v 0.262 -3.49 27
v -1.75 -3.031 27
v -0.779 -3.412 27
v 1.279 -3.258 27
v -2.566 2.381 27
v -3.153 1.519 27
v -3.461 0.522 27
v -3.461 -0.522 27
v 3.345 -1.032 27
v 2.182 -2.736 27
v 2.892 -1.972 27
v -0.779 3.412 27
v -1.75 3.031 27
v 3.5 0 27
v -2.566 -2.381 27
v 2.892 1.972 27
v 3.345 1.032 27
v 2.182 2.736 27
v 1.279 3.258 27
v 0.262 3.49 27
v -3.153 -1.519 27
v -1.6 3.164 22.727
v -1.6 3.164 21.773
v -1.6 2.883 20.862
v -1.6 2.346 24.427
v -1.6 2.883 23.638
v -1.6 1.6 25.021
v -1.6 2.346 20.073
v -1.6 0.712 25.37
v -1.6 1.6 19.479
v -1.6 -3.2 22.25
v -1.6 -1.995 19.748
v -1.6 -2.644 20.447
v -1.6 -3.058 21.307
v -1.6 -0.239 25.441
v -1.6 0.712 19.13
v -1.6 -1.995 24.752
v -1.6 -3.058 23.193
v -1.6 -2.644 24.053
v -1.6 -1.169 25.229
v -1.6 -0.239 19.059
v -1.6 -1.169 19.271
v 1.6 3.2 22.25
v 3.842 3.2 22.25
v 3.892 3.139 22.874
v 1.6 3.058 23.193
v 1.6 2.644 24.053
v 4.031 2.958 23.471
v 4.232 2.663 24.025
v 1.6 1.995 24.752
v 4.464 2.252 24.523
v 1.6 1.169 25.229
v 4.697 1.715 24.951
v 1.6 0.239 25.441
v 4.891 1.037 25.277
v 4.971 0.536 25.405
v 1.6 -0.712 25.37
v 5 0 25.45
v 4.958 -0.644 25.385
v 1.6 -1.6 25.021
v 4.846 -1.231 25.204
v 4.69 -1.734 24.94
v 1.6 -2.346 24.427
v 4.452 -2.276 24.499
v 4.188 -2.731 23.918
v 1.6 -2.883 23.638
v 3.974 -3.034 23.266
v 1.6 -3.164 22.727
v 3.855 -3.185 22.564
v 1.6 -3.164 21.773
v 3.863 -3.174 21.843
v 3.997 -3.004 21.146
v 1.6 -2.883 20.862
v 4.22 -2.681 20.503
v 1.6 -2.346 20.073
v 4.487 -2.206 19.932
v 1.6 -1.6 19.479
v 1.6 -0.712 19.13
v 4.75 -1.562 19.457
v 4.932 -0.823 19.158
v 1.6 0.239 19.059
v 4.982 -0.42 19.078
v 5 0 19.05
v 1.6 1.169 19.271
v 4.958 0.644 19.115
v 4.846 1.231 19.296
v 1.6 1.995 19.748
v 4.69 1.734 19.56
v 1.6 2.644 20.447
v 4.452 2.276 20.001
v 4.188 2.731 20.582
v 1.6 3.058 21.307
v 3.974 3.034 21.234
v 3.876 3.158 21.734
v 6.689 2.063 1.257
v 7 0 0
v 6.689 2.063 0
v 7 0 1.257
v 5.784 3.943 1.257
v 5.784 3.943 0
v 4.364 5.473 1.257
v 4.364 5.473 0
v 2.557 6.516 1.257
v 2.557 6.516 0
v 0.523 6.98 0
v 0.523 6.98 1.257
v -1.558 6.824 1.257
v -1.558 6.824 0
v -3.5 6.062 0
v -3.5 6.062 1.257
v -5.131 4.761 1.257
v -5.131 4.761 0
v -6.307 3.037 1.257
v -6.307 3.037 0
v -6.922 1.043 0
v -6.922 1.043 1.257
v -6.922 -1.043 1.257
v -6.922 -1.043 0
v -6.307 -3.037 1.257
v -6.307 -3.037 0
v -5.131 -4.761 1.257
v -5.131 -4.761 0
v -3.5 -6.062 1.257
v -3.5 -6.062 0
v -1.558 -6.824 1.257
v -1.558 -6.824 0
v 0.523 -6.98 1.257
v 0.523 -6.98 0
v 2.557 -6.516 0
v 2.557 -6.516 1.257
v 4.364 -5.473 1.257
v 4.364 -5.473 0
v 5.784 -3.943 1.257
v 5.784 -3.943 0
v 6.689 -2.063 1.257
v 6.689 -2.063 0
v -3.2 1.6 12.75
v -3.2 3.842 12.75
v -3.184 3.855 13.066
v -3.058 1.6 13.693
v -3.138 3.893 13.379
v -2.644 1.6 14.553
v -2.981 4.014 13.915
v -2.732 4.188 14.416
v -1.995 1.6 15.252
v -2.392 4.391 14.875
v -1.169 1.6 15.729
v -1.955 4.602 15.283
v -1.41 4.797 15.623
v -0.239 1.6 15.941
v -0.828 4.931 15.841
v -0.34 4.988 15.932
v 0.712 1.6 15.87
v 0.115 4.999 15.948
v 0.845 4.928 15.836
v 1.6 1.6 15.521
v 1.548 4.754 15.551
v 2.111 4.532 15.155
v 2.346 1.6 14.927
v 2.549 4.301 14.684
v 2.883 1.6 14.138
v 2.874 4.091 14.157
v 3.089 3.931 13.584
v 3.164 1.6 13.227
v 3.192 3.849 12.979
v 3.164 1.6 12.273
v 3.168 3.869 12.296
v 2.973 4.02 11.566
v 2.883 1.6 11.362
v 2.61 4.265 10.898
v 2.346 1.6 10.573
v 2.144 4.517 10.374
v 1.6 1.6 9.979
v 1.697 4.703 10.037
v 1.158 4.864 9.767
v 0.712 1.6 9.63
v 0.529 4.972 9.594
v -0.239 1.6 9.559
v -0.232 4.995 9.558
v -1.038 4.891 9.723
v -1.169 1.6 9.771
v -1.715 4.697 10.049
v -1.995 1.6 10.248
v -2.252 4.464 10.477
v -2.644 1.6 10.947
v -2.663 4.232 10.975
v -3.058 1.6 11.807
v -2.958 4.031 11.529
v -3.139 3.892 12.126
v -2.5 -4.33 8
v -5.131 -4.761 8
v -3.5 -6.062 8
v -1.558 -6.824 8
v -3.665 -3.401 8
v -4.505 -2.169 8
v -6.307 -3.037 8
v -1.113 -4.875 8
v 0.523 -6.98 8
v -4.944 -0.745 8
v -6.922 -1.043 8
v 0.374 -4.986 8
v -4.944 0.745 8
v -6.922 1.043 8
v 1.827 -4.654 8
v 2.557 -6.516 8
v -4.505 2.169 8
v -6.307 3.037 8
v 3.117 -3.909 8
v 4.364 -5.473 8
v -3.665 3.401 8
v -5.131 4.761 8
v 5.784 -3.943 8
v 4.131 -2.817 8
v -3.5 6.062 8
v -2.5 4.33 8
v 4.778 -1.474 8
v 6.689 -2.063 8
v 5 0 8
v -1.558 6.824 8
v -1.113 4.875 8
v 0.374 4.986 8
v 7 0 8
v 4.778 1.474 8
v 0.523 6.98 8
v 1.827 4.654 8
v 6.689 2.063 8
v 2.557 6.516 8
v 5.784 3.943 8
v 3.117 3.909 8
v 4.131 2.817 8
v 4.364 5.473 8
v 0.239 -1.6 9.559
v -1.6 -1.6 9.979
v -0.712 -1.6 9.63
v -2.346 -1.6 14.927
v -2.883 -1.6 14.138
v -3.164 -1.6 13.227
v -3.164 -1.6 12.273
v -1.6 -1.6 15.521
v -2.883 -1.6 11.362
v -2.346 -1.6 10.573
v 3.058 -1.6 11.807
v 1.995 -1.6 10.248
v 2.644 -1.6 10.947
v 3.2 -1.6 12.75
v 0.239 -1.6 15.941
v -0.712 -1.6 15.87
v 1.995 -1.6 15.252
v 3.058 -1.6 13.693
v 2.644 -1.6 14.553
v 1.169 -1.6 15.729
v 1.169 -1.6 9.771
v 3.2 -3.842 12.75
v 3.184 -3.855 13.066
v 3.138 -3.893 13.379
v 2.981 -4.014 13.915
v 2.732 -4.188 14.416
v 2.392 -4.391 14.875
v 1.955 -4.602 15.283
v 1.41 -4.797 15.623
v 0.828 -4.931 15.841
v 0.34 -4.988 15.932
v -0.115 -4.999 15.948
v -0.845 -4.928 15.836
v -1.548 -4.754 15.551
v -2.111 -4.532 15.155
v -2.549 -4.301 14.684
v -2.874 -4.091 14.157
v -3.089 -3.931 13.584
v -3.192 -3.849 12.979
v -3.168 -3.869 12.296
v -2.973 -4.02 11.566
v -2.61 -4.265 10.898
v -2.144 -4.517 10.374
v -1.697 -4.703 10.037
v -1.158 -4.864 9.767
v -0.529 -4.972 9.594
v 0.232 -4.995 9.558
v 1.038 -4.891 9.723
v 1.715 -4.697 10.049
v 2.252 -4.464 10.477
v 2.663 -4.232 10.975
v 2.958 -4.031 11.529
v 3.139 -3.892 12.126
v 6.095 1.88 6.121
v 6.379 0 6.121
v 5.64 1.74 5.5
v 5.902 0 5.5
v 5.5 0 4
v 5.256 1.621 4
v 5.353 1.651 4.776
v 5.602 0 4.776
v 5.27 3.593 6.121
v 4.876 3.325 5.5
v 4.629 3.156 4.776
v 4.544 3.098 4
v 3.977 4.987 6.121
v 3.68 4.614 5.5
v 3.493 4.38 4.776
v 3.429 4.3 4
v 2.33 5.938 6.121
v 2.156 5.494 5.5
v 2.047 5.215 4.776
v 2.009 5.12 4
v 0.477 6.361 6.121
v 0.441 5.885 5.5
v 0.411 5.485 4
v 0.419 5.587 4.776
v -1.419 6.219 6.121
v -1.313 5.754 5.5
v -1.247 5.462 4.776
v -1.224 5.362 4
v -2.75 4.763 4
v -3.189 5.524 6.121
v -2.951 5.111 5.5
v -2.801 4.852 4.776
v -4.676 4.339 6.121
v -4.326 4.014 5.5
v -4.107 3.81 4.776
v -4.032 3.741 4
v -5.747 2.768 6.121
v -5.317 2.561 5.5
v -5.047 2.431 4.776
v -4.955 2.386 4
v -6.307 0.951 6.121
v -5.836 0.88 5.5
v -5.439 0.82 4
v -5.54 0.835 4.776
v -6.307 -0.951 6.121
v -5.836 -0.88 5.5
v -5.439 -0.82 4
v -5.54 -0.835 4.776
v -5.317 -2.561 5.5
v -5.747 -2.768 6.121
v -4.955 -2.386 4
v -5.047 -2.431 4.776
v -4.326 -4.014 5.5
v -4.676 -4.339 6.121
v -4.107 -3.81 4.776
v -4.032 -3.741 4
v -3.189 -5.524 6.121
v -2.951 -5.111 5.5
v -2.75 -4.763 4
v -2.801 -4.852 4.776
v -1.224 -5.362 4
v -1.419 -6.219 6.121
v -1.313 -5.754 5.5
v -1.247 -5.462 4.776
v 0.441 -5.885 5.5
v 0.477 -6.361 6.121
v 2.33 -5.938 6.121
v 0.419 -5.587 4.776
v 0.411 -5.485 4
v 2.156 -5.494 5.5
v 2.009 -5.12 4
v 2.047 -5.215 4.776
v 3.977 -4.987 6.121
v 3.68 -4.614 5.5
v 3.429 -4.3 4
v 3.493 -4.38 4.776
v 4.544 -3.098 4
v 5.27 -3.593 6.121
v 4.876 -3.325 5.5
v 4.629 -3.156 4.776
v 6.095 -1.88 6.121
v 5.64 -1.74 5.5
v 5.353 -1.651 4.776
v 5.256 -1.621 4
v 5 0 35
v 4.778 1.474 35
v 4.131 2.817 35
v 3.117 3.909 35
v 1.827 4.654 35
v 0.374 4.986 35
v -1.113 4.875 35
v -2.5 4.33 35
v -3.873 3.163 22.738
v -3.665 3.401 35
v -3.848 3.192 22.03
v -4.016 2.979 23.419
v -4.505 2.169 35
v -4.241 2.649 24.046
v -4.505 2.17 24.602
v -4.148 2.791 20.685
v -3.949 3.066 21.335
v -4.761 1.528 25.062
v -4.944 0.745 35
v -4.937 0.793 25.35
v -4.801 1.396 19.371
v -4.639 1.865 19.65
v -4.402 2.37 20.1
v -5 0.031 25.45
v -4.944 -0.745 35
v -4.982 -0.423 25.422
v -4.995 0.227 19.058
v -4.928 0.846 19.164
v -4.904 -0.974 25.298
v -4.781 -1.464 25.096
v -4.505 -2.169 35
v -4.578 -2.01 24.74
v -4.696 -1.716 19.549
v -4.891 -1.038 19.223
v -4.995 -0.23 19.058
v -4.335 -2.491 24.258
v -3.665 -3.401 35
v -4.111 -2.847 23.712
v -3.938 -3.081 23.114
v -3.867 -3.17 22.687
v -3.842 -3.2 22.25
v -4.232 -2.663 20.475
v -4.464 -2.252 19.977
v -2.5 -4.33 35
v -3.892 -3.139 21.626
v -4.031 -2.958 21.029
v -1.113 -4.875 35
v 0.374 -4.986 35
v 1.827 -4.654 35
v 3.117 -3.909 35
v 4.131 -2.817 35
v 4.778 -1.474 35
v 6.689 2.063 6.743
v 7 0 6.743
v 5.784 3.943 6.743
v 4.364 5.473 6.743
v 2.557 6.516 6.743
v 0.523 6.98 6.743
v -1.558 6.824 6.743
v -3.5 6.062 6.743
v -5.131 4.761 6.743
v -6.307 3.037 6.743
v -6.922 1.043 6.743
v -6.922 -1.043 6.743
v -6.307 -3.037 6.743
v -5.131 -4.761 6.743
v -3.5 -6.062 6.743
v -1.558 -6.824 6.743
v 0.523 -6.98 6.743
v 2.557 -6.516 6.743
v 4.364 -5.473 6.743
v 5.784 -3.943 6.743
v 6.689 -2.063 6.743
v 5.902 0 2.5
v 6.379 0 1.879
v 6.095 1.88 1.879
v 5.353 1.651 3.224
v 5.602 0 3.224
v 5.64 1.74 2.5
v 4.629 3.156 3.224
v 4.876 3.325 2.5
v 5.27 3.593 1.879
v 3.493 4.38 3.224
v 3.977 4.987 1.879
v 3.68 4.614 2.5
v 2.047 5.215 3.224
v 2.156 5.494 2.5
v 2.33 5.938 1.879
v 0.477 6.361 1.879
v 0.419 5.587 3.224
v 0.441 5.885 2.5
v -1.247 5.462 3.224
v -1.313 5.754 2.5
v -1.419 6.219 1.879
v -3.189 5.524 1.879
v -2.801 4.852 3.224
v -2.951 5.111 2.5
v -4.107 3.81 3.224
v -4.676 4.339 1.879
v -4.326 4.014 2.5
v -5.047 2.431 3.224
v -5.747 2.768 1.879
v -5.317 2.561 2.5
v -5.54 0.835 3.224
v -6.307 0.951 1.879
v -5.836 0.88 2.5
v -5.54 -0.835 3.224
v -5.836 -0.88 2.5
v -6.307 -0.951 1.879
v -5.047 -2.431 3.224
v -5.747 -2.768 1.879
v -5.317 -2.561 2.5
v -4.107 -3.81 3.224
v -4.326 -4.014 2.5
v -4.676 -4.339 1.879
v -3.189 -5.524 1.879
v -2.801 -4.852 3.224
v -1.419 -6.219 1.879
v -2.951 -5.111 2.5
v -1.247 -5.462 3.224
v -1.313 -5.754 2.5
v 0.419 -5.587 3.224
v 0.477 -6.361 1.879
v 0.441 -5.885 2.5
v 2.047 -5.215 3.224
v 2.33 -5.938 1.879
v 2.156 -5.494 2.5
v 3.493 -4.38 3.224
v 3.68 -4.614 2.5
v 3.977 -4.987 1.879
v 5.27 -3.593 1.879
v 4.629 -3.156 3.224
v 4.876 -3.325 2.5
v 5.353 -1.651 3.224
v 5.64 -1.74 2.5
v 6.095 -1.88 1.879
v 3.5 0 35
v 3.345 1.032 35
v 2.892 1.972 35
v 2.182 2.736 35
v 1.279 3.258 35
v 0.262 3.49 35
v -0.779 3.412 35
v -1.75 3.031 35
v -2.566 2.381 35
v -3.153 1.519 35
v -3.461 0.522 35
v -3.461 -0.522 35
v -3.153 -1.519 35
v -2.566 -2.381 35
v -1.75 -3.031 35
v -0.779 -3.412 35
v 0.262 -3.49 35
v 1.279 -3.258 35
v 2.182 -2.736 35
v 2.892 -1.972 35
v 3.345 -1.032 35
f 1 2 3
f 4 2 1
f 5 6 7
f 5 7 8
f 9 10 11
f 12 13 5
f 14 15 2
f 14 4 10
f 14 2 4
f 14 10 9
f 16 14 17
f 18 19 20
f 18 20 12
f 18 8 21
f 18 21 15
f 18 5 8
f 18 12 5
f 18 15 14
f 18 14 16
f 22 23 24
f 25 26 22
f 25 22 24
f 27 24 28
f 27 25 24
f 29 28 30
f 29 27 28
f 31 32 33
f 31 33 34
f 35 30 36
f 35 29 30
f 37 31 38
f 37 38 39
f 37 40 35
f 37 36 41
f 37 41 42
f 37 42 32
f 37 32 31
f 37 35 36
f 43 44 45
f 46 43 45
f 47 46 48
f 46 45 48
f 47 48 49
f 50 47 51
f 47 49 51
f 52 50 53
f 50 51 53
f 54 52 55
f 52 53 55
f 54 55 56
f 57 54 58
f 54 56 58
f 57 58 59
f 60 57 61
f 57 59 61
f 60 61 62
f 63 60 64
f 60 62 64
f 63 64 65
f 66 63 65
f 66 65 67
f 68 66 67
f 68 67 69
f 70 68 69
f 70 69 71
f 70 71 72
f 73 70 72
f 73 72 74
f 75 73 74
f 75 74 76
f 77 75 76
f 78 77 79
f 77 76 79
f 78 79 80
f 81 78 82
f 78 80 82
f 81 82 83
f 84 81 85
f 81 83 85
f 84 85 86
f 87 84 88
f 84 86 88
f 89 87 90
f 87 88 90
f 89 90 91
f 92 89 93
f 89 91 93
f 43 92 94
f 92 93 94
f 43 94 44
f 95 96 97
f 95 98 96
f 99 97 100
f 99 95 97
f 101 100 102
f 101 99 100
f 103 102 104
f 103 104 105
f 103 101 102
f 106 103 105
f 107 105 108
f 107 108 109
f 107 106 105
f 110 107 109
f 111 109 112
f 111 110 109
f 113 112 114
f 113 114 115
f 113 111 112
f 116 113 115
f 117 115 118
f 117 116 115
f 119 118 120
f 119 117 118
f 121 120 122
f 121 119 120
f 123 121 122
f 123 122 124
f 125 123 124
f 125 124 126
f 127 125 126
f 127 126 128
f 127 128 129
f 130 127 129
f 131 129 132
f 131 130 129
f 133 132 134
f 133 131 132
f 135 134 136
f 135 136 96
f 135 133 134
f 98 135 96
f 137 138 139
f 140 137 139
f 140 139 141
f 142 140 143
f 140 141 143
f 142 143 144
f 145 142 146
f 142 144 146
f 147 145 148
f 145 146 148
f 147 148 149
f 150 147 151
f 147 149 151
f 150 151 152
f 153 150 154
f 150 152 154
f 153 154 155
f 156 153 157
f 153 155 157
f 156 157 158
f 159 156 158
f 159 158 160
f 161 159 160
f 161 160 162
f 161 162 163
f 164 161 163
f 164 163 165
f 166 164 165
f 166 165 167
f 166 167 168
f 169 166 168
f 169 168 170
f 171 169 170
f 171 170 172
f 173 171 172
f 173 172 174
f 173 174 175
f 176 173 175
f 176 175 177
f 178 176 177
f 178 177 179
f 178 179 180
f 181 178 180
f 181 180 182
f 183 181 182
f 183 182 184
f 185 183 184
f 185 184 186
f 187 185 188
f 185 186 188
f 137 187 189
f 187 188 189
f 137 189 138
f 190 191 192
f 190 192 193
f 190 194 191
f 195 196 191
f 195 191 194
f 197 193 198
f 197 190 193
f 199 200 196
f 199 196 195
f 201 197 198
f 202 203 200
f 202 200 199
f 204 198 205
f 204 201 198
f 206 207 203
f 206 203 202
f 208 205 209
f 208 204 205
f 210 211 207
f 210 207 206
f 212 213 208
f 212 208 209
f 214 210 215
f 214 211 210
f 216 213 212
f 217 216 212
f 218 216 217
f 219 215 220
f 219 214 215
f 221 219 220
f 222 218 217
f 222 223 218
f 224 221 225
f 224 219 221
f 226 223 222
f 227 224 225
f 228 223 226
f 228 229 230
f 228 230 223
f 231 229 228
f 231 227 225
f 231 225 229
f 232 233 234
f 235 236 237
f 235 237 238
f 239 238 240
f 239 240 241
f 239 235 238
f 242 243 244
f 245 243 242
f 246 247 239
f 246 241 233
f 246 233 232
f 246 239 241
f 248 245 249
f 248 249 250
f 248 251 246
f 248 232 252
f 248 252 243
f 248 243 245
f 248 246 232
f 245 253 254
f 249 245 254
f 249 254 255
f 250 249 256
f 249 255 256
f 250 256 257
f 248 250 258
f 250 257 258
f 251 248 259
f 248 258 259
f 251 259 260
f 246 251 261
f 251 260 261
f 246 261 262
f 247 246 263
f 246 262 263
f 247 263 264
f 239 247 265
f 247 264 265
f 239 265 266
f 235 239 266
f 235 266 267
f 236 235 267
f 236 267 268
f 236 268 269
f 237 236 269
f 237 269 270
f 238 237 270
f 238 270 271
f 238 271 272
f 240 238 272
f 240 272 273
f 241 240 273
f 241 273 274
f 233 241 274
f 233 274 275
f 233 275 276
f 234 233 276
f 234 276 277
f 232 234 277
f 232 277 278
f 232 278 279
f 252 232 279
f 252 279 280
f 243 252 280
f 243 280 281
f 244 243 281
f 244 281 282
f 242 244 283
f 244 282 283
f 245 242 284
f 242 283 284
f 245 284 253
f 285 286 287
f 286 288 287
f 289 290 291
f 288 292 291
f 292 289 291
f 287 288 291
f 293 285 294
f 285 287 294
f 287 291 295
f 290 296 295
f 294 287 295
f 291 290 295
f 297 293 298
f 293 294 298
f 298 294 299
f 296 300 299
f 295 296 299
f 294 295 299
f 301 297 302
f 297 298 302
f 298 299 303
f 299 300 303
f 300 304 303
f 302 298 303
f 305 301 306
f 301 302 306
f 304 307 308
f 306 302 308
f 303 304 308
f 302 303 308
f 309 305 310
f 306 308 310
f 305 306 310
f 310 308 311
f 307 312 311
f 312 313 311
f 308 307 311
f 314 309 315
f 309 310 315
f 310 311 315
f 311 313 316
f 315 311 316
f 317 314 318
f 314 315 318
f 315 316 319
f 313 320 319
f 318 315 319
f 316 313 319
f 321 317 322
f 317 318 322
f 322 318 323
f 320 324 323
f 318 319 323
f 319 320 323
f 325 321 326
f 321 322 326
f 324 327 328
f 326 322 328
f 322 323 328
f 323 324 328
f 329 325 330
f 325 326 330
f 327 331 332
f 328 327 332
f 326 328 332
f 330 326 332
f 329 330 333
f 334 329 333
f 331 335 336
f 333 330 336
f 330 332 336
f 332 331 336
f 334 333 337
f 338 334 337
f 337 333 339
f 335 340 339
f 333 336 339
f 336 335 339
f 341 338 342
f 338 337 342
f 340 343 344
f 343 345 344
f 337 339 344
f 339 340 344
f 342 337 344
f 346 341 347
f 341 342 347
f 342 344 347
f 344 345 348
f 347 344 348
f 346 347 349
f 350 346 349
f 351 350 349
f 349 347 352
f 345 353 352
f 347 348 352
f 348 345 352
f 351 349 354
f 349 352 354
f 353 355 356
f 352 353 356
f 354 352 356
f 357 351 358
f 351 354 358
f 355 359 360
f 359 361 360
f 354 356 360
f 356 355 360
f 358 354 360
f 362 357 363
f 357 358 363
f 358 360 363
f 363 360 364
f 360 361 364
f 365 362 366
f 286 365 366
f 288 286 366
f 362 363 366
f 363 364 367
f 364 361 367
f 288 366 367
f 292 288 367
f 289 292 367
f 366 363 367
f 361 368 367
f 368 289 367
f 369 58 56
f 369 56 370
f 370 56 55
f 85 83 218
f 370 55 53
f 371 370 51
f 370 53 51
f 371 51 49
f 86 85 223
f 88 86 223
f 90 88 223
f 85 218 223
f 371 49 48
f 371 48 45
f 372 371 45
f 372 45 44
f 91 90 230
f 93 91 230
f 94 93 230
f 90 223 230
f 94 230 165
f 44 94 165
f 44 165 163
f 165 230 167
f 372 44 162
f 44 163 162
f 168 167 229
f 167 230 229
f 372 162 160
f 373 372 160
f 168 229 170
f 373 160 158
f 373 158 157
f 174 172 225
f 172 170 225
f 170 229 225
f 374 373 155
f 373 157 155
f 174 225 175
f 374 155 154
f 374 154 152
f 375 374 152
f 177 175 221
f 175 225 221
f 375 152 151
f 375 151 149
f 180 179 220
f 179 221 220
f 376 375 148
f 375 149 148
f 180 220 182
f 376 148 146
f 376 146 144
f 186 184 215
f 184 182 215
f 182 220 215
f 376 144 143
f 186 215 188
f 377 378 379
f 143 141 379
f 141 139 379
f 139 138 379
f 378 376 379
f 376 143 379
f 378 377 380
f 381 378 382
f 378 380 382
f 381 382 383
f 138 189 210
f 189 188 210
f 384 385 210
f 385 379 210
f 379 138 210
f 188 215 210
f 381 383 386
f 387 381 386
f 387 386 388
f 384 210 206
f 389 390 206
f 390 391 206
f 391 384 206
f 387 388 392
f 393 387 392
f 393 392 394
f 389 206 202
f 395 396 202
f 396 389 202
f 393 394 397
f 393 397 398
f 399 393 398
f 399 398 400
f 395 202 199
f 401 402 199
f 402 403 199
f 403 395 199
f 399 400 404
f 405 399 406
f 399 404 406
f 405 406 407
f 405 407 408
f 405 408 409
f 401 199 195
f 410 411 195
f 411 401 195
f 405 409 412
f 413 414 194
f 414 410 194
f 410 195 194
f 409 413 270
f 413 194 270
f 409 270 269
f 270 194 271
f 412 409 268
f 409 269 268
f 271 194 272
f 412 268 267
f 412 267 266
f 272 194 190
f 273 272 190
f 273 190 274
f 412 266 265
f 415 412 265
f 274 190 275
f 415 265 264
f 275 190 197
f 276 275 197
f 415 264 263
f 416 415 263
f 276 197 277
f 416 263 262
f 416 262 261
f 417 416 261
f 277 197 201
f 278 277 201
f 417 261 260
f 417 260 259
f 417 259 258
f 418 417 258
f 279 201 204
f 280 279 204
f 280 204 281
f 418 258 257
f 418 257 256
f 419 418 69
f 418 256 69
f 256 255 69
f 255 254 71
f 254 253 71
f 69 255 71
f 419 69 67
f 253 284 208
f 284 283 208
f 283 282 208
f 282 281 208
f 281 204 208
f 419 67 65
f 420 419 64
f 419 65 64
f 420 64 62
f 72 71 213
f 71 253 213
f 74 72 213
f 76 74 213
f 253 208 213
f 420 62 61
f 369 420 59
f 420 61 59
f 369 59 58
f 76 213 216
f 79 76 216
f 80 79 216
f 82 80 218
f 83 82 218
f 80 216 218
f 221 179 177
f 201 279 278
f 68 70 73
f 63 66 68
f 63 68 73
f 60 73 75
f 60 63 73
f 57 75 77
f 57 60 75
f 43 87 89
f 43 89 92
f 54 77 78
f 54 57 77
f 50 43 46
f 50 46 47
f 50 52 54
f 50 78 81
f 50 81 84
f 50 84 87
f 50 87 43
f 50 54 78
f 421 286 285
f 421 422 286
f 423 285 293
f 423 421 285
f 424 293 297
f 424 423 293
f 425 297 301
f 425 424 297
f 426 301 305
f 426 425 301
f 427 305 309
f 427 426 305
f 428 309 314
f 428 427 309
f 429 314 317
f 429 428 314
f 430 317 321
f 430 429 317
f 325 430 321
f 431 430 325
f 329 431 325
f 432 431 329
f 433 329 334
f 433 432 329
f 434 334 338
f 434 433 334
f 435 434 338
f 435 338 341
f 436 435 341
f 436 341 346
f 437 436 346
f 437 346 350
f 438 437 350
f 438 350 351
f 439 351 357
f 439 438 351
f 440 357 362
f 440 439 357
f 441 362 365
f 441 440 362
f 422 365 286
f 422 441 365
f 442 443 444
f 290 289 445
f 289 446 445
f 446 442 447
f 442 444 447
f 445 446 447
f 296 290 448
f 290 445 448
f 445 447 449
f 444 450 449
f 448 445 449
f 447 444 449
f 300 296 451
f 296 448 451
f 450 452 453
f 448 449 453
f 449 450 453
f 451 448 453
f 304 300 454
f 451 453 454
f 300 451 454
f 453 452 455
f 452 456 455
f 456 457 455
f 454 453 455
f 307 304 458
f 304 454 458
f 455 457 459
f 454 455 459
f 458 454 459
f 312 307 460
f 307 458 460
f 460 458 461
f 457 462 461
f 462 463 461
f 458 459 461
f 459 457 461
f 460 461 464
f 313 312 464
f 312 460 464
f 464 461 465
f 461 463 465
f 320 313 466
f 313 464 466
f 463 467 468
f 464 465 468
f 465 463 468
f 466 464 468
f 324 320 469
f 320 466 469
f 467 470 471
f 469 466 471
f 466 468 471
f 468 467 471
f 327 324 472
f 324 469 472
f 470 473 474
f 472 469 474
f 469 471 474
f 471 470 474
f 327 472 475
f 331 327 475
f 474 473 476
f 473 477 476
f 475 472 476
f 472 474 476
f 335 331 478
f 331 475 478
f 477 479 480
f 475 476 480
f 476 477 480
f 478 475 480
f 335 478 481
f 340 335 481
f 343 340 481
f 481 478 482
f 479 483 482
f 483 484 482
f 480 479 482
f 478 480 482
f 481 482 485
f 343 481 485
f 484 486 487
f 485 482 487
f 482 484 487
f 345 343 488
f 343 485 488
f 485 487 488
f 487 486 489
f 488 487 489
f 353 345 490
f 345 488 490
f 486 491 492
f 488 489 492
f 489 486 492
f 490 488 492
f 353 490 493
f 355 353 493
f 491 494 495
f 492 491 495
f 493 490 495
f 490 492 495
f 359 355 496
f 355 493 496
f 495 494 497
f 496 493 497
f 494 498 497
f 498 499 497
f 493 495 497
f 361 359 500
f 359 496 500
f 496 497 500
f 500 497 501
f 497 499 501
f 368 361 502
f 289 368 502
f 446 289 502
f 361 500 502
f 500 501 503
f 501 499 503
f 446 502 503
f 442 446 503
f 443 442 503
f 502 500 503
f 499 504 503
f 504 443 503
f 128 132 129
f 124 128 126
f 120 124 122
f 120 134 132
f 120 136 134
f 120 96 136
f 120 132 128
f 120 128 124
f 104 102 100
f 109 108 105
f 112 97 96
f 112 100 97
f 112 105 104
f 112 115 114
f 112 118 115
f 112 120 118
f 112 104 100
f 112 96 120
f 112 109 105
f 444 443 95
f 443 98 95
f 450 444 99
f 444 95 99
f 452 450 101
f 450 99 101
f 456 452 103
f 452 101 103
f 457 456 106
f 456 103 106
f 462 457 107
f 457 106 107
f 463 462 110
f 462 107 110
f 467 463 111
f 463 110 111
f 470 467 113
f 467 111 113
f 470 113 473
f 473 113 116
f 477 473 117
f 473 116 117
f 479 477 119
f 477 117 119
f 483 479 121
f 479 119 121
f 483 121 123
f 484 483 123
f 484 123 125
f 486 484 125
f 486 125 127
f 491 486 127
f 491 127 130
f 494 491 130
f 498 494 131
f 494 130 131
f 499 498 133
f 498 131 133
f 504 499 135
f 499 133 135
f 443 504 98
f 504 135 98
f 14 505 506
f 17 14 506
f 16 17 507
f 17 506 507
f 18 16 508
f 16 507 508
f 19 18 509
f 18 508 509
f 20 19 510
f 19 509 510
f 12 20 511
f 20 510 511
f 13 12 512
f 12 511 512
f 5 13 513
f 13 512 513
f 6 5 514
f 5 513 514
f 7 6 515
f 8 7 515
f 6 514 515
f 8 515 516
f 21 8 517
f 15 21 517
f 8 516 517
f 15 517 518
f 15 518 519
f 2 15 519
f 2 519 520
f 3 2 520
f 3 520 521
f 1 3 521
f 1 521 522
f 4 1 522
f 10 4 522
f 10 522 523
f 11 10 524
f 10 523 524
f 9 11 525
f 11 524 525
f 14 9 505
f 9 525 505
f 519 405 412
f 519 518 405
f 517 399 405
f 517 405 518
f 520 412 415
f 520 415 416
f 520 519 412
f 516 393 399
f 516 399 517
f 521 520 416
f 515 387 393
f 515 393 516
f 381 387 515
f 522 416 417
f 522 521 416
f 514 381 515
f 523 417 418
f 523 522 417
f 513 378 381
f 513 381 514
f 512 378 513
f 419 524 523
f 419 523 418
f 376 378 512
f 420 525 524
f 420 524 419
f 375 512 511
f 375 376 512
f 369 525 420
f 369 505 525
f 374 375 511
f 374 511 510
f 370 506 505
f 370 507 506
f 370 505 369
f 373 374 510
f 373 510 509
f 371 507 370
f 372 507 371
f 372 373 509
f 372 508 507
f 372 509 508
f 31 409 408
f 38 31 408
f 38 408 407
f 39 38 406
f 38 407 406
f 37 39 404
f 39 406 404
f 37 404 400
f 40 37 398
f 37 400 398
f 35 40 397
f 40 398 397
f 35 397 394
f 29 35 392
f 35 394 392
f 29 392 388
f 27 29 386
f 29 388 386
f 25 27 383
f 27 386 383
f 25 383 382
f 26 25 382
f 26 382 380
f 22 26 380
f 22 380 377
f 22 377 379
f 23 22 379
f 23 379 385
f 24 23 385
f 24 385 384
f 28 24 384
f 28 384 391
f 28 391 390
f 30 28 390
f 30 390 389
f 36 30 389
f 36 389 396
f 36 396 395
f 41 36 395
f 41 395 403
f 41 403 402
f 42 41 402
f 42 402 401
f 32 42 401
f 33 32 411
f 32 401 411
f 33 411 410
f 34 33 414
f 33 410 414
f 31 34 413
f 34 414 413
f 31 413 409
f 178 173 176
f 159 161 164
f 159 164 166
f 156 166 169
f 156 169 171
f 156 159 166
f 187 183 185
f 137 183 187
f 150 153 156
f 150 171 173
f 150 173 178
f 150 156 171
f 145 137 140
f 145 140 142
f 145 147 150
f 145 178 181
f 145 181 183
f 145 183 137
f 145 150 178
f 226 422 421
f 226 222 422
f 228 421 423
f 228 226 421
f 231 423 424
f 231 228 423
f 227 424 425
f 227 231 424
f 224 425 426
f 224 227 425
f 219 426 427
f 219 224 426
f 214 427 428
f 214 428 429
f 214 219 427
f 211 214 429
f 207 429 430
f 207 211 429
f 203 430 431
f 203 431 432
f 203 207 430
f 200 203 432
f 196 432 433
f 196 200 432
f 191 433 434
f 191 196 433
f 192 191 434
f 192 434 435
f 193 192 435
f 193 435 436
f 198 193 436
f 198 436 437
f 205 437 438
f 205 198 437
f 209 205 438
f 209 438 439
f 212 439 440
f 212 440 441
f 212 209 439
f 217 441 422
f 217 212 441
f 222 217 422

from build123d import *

# Parameters (mm, degrees)
SKETCH_R        = 5
PAD_DEPTH       = 35
SKETCH019_R     = 3.5
POCKET007_DEPTH = 8
SKETCH066_R     = 3.2
POCKET_DEPTH    = 3.4
SKETCH067_R     = 3.2
POCKET025_DEPTH = 3.4
SKETCH068_R     = 3.2
POCKET026_DEPTH = 3.4
SKETCH069_R     = 3.2
POCKET027_DEPTH = 3.4


with BuildPart() as part:
    # Sketch → Pad (new body)
    with BuildSketch(Plane.XY):
        Circle(SKETCH_R)
    extrude(amount=PAD_DEPTH)

    # Sketch019 → Pocket007 (cut)
    with BuildSketch(Plane.XY.offset(35)):
        Circle(SKETCH019_R)
    extrude(amount=-POCKET007_DEPTH, mode=Mode.SUBTRACT)

    # Sketch034 → Revolution (revolve)
    with BuildSketch(Plane.XZ):
        with BuildLine():
            ThreePointArc((6.37868, 6.121321), (5.728361, 5.148051), (5.5, 4))
            ThreePointArc((5.5, 4), (5.728361, 2.851949), (6.37868, 1.878679))
            Line((6.37868, 1.878679), (7, 1.25736))
            Line((7, 0), (7, 1.25736))
            Line((0, 0), (7, 0))
            Line((0, 8), (0, 0))
            Line((7, 8), (0, 8))
            Line((7, 6.74264), (7, 8))
            Line((6.37868, 6.121321), (7, 6.74264))
        make_face()
    revolve(axis=Axis((0, 0, 0), (0, 0, 1)))

    # Sketch066 (on DatumPlane) → Pocket (cut)
    with BuildSketch(Plane(origin=(5, 0, 35), x_dir=(0, 1, 0), z_dir=(1, 0, 0))):
        with Locations((0, -12.75)):
            Circle(SKETCH066_R)
    extrude(amount=-POCKET_DEPTH, mode=Mode.SUBTRACT)

    # Sketch067 (on DatumPlane) → Pocket025 (cut)
    with BuildSketch(Plane(origin=(0, 5, 35), x_dir=(-1, 0, 0), z_dir=(0, 1, 0))):
        with Locations((0, -22.25)):
            Circle(SKETCH067_R)
    extrude(amount=-POCKET025_DEPTH, mode=Mode.SUBTRACT)

    # Sketch068 (on DatumPlane) → Pocket026 (cut)
    with BuildSketch(Plane(origin=(-5, 0, 35), x_dir=(0, -1, 0), z_dir=(-1, 0, 0))):
        with Locations((0, -12.75)):
            Circle(SKETCH068_R)
    extrude(amount=-POCKET026_DEPTH, mode=Mode.SUBTRACT)

    # Sketch069 (on DatumPlane) → Pocket027 (cut)
    with BuildSketch(Plane(origin=(0, -5, 35), x_dir=(1, 0, 0), z_dir=(0, -1, 0))):
        with Locations((0, -22.25)):
            Circle(SKETCH069_R)
    extrude(amount=-POCKET027_DEPTH, mode=Mode.SUBTRACT)


solid = part.part
